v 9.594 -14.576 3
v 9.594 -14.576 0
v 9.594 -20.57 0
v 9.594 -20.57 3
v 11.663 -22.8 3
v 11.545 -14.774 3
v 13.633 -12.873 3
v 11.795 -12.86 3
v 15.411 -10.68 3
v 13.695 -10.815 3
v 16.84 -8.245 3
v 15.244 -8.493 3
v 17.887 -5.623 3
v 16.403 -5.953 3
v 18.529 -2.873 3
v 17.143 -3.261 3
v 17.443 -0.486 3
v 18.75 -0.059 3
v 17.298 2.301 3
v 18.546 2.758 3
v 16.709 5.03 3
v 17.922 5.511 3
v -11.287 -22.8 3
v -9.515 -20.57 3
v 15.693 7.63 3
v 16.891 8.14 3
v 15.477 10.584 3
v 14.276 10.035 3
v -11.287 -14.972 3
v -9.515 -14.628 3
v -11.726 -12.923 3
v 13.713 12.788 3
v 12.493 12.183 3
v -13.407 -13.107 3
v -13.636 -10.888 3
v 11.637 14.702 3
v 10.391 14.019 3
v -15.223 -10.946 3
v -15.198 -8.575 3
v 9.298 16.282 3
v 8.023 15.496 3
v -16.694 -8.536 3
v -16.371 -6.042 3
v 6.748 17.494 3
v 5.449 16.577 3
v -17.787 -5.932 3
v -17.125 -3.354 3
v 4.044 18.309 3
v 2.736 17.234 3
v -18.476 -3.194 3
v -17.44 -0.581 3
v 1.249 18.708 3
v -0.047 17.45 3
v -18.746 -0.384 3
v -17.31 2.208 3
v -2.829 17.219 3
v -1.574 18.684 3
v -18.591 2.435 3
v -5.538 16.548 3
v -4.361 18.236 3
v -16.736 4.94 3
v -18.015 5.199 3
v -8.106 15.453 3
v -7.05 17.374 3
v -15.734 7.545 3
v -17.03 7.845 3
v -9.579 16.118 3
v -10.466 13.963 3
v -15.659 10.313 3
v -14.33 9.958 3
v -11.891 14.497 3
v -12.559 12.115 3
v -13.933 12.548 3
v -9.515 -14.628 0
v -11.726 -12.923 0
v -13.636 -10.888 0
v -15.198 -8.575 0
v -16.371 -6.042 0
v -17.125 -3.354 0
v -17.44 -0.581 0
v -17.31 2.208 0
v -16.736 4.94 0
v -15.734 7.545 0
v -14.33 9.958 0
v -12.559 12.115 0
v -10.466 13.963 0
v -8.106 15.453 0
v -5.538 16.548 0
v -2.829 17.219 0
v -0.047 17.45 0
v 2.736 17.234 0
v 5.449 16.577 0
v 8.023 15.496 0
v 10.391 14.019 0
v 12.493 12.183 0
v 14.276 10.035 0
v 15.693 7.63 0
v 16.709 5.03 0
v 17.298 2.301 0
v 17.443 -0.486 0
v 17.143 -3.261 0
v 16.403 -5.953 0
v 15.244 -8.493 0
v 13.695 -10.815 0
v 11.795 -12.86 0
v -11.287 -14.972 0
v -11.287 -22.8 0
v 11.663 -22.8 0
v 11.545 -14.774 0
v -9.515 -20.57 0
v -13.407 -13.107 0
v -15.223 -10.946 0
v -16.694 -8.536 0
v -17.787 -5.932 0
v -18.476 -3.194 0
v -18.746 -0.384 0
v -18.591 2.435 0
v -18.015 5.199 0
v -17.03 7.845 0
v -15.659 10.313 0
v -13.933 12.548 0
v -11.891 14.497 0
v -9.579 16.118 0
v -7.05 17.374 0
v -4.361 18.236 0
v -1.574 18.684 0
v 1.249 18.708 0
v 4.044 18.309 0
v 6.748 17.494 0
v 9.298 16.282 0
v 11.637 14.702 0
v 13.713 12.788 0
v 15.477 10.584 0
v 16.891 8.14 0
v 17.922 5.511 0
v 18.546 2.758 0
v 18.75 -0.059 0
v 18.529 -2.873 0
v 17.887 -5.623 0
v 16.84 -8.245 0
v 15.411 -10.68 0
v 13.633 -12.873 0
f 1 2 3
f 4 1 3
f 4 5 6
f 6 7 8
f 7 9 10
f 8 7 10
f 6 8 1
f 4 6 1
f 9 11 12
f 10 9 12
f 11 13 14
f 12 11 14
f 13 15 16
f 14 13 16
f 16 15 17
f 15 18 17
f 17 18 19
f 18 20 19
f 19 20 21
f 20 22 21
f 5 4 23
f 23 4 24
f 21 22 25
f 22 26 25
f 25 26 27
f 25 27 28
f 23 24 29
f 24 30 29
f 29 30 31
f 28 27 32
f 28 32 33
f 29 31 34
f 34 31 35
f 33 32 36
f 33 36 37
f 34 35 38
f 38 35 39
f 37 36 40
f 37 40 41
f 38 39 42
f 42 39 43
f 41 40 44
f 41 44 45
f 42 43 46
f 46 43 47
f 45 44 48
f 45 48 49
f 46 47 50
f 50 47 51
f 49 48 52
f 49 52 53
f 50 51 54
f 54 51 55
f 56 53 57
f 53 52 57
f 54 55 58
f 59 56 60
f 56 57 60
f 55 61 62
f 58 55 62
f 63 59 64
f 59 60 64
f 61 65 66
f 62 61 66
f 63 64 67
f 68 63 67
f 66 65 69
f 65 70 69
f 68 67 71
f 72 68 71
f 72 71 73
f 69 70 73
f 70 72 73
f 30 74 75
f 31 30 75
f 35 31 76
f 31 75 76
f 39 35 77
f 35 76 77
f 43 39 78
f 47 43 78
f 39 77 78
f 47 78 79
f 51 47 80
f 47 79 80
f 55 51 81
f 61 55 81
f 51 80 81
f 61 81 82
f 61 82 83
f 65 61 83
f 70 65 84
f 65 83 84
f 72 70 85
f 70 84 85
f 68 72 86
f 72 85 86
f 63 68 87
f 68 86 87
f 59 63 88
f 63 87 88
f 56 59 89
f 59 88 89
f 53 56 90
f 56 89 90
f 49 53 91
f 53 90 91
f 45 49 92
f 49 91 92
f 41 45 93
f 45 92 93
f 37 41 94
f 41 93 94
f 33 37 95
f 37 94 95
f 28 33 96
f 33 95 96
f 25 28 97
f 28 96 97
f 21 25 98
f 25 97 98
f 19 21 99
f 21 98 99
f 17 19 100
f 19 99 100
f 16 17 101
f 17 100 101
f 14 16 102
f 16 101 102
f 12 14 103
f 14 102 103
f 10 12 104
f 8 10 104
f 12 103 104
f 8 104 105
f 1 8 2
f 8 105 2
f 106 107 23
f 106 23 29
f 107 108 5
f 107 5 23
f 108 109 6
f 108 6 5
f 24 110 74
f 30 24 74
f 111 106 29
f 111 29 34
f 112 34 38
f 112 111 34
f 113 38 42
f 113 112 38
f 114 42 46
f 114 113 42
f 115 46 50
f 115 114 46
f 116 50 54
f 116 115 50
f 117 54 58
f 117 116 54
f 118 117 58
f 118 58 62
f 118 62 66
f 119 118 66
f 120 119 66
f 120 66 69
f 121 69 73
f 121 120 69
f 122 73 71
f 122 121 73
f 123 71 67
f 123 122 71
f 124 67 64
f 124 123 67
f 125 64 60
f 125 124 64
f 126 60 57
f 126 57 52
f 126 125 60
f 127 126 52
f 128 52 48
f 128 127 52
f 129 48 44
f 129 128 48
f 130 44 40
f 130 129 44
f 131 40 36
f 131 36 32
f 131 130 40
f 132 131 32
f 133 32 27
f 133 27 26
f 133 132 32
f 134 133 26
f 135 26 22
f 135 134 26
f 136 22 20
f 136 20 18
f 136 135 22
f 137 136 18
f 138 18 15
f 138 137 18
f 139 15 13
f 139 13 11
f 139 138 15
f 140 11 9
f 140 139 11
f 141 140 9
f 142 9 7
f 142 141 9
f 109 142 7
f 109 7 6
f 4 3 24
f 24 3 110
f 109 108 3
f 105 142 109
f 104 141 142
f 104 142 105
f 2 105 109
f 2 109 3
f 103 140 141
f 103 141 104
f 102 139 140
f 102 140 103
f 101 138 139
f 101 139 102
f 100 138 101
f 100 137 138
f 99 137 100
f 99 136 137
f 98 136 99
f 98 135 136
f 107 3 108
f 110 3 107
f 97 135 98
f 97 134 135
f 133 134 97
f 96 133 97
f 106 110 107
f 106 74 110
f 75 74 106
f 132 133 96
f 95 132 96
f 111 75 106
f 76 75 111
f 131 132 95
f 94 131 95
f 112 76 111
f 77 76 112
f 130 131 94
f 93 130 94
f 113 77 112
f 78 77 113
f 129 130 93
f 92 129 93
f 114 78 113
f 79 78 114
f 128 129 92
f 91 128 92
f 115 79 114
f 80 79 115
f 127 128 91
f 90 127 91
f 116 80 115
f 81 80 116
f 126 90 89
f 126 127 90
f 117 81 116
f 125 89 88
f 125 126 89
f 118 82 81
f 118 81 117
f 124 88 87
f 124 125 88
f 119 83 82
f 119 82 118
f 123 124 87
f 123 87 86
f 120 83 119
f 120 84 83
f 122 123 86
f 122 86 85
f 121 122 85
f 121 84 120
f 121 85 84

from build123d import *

# Parameters (mm, degrees)
BOSS_EXTRUDE1_DEPTH = 3
CUT_EXTRUDE1_DEPTH  = 3


with BuildPart() as part:
    # Sketch4 → Boss-Extrude1 (new body)
    with BuildSketch(Plane.XY):
        with BuildLine():
            Line((0.18777702, -22.8), (-11.28722298, -22.8))
            Line((-11.28722298, -22.8), (-11.28722298, -14.972010466))
            ThreePointArc((-11.28722298, -14.972010466), (-0.162678986, 18.749294268), (11.545314563, -14.773903061))
            Line((11.545314563, -14.773903061), (11.66277702, -22.8))
            Line((11.66277702, -22.8), (0.18777702, -22.8))
        make_face()
    extrude(amount=BOSS_EXTRUDE1_DEPTH)

    # Sketch5 → Cut-Extrude1 (cut)
    with BuildSketch(Plane.XY):
        with BuildLine():
            Line((9.593685177, -14.576134767), (9.593685177, -20.570344852))
            Line((9.593685177, -20.570344852), (-9.514830363, -20.570344852))
            Line((-9.514830363, -20.570344852), (-9.514830363, -14.627730622))
            ThreePointArc((-9.514830363, -14.627730622), (-0.047117443, 17.449936388), (9.593685177, -14.576134767))
        make_face()
    extrude(amount=CUT_EXTRUDE1_DEPTH, mode=Mode.SUBTRACT)


solid = part.part
